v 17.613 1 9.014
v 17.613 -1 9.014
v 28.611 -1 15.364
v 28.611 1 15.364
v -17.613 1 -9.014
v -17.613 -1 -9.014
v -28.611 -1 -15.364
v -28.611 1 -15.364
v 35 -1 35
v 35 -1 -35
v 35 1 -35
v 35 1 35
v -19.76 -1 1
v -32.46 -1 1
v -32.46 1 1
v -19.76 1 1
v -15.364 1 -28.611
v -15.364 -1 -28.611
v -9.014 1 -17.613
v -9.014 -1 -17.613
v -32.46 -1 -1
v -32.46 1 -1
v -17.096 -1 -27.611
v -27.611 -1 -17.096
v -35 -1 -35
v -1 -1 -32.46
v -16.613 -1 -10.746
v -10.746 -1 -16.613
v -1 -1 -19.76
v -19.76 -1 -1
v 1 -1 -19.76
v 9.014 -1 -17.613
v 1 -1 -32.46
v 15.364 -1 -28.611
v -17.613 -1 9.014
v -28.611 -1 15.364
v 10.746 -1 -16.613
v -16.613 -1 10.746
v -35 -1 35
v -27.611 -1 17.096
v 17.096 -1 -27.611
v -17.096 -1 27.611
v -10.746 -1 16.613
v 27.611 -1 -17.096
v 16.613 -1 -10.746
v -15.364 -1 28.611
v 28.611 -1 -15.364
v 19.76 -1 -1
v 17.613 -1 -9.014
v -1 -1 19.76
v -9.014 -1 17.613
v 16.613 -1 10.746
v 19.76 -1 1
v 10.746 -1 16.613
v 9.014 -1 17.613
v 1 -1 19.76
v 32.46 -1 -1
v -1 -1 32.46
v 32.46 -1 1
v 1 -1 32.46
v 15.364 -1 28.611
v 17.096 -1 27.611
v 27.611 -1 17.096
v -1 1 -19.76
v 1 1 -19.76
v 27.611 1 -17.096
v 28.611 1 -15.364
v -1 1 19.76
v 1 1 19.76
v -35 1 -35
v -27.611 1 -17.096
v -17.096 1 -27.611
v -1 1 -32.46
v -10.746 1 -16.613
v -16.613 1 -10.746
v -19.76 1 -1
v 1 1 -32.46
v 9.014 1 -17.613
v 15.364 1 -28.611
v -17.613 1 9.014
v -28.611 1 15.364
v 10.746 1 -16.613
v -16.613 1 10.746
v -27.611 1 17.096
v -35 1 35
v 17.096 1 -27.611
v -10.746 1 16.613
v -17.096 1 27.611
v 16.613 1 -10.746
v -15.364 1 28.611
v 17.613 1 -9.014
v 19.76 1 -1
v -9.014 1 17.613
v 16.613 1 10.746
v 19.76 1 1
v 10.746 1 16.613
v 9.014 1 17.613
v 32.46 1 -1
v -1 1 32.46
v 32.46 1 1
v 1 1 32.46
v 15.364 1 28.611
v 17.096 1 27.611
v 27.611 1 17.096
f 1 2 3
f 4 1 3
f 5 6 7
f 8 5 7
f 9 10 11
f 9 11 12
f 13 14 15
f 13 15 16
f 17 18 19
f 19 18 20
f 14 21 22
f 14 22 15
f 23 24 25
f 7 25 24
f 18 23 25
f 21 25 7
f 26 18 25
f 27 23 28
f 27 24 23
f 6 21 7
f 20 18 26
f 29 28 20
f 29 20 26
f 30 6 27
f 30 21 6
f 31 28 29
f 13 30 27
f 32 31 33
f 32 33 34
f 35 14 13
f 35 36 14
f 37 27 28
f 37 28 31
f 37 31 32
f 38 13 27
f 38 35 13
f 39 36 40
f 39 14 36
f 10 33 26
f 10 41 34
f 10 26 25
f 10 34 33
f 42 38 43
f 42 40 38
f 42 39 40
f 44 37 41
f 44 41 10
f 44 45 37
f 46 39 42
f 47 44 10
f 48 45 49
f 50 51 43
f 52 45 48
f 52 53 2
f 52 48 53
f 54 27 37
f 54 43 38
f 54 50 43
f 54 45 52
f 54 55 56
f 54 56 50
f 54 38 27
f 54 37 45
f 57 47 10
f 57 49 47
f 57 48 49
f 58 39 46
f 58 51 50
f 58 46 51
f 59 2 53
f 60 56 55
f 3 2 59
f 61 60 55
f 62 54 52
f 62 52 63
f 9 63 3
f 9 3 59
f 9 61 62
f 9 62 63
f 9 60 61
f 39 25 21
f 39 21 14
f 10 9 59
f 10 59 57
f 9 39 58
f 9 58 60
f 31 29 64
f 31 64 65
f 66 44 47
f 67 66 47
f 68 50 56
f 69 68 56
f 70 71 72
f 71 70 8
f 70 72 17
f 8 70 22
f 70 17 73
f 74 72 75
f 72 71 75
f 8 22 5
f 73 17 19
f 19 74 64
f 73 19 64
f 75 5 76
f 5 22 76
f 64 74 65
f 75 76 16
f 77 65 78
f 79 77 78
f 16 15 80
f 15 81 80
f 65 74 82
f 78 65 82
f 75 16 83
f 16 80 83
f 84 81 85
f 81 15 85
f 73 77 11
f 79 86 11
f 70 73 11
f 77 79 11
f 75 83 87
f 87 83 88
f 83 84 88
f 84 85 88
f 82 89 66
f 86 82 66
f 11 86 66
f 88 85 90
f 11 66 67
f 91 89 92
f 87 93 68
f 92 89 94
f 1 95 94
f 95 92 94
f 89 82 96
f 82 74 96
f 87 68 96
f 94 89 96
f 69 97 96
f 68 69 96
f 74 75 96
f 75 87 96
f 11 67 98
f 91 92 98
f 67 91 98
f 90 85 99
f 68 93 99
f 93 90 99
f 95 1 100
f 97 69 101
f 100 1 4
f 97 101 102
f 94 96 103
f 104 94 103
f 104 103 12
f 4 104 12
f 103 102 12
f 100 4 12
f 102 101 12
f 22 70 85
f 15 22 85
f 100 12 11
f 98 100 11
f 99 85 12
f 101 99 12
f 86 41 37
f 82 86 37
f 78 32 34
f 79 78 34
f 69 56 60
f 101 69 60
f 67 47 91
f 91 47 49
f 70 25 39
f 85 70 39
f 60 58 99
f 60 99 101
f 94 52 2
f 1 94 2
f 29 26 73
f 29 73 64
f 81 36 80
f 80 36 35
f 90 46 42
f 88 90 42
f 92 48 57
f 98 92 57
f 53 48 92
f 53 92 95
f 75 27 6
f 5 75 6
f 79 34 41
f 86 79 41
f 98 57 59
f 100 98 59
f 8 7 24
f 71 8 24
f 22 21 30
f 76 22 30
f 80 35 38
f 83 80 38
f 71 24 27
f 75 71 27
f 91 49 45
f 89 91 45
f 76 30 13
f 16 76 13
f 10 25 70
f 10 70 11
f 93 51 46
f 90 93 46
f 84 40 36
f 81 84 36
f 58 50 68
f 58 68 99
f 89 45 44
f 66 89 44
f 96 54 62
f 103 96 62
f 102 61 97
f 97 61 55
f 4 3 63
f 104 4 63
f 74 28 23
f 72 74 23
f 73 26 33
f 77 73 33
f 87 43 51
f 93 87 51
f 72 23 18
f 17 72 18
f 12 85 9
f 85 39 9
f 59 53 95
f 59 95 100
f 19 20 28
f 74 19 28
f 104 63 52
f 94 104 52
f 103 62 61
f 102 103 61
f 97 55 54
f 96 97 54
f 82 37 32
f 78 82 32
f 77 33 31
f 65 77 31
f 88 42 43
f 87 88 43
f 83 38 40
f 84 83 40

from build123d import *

# Parameters (mm, degrees)
F0_W     = 70
F0_H     = 70
F1_DEPTH = 1
F2_W     = 2
F2_H     = 12.7
F2_W_2   = 12.7
F2_H_2   = 2
F3_DEPTH = 2.001


with BuildPart() as f1:
    # F0 (on Front) → F1 (new body, symmetric)
    with BuildSketch(Plane.XZ):
        Rectangle(F0_W, F0_H)
    extrude(amount=F1_DEPTH, both=True)

    # F2 (on face) → F3 (cut, through all)
    with BuildSketch(Plane.XZ.offset(1)):
        with Locations((0, 26.11)):
            Rectangle(F2_W, F2_H)
        Polygon((-9.013975, 17.612662), (-15.363975, 28.611185), (-17.096025, 27.611185), (-10.746025, 16.612662), align=None)
        Polygon((-16.612662, 10.746025), (-27.611185, 17.096025), (-28.611185, 15.363975), (-17.612662, 9.013975), align=None)
        with Locations((-26.11, 0)):
            Rectangle(F2_W_2, F2_H_2)
        Polygon((-17.612662, -9.013975), (-28.611185, -15.363975), (-27.611185, -17.096025), (-16.612662, -10.746025), align=None)
        Polygon((-10.746025, -16.612662), (-17.096025, -27.611185), (-15.363975, -28.611185), (-9.013975, -17.612662), align=None)
        with Locations((0, -26.11)):
            Rectangle(F2_W, F2_H)
        Polygon((9.013975, -17.612662), (15.363975, -28.611185), (17.096025, -27.611185), (10.746025, -16.612662), align=None)
        Polygon((16.612662, -10.746025), (27.611185, -17.096025), (28.611185, -15.363975), (17.612662, -9.013975), align=None)
        with Locations((26.11, 0)):
            Rectangle(F2_W_2, F2_H_2)
        Polygon((17.612662, 9.013975), (28.611185, 15.363975), (27.611185, 17.096025), (16.612662, 10.746025), align=None)
        Polygon((10.746025, 16.612662), (17.096025, 27.611185), (15.363975, 28.611185), (9.013975, 17.612662), align=None)
    extrude(amount=-F3_DEPTH, mode=Mode.SUBTRACT)


solid = f1.part
